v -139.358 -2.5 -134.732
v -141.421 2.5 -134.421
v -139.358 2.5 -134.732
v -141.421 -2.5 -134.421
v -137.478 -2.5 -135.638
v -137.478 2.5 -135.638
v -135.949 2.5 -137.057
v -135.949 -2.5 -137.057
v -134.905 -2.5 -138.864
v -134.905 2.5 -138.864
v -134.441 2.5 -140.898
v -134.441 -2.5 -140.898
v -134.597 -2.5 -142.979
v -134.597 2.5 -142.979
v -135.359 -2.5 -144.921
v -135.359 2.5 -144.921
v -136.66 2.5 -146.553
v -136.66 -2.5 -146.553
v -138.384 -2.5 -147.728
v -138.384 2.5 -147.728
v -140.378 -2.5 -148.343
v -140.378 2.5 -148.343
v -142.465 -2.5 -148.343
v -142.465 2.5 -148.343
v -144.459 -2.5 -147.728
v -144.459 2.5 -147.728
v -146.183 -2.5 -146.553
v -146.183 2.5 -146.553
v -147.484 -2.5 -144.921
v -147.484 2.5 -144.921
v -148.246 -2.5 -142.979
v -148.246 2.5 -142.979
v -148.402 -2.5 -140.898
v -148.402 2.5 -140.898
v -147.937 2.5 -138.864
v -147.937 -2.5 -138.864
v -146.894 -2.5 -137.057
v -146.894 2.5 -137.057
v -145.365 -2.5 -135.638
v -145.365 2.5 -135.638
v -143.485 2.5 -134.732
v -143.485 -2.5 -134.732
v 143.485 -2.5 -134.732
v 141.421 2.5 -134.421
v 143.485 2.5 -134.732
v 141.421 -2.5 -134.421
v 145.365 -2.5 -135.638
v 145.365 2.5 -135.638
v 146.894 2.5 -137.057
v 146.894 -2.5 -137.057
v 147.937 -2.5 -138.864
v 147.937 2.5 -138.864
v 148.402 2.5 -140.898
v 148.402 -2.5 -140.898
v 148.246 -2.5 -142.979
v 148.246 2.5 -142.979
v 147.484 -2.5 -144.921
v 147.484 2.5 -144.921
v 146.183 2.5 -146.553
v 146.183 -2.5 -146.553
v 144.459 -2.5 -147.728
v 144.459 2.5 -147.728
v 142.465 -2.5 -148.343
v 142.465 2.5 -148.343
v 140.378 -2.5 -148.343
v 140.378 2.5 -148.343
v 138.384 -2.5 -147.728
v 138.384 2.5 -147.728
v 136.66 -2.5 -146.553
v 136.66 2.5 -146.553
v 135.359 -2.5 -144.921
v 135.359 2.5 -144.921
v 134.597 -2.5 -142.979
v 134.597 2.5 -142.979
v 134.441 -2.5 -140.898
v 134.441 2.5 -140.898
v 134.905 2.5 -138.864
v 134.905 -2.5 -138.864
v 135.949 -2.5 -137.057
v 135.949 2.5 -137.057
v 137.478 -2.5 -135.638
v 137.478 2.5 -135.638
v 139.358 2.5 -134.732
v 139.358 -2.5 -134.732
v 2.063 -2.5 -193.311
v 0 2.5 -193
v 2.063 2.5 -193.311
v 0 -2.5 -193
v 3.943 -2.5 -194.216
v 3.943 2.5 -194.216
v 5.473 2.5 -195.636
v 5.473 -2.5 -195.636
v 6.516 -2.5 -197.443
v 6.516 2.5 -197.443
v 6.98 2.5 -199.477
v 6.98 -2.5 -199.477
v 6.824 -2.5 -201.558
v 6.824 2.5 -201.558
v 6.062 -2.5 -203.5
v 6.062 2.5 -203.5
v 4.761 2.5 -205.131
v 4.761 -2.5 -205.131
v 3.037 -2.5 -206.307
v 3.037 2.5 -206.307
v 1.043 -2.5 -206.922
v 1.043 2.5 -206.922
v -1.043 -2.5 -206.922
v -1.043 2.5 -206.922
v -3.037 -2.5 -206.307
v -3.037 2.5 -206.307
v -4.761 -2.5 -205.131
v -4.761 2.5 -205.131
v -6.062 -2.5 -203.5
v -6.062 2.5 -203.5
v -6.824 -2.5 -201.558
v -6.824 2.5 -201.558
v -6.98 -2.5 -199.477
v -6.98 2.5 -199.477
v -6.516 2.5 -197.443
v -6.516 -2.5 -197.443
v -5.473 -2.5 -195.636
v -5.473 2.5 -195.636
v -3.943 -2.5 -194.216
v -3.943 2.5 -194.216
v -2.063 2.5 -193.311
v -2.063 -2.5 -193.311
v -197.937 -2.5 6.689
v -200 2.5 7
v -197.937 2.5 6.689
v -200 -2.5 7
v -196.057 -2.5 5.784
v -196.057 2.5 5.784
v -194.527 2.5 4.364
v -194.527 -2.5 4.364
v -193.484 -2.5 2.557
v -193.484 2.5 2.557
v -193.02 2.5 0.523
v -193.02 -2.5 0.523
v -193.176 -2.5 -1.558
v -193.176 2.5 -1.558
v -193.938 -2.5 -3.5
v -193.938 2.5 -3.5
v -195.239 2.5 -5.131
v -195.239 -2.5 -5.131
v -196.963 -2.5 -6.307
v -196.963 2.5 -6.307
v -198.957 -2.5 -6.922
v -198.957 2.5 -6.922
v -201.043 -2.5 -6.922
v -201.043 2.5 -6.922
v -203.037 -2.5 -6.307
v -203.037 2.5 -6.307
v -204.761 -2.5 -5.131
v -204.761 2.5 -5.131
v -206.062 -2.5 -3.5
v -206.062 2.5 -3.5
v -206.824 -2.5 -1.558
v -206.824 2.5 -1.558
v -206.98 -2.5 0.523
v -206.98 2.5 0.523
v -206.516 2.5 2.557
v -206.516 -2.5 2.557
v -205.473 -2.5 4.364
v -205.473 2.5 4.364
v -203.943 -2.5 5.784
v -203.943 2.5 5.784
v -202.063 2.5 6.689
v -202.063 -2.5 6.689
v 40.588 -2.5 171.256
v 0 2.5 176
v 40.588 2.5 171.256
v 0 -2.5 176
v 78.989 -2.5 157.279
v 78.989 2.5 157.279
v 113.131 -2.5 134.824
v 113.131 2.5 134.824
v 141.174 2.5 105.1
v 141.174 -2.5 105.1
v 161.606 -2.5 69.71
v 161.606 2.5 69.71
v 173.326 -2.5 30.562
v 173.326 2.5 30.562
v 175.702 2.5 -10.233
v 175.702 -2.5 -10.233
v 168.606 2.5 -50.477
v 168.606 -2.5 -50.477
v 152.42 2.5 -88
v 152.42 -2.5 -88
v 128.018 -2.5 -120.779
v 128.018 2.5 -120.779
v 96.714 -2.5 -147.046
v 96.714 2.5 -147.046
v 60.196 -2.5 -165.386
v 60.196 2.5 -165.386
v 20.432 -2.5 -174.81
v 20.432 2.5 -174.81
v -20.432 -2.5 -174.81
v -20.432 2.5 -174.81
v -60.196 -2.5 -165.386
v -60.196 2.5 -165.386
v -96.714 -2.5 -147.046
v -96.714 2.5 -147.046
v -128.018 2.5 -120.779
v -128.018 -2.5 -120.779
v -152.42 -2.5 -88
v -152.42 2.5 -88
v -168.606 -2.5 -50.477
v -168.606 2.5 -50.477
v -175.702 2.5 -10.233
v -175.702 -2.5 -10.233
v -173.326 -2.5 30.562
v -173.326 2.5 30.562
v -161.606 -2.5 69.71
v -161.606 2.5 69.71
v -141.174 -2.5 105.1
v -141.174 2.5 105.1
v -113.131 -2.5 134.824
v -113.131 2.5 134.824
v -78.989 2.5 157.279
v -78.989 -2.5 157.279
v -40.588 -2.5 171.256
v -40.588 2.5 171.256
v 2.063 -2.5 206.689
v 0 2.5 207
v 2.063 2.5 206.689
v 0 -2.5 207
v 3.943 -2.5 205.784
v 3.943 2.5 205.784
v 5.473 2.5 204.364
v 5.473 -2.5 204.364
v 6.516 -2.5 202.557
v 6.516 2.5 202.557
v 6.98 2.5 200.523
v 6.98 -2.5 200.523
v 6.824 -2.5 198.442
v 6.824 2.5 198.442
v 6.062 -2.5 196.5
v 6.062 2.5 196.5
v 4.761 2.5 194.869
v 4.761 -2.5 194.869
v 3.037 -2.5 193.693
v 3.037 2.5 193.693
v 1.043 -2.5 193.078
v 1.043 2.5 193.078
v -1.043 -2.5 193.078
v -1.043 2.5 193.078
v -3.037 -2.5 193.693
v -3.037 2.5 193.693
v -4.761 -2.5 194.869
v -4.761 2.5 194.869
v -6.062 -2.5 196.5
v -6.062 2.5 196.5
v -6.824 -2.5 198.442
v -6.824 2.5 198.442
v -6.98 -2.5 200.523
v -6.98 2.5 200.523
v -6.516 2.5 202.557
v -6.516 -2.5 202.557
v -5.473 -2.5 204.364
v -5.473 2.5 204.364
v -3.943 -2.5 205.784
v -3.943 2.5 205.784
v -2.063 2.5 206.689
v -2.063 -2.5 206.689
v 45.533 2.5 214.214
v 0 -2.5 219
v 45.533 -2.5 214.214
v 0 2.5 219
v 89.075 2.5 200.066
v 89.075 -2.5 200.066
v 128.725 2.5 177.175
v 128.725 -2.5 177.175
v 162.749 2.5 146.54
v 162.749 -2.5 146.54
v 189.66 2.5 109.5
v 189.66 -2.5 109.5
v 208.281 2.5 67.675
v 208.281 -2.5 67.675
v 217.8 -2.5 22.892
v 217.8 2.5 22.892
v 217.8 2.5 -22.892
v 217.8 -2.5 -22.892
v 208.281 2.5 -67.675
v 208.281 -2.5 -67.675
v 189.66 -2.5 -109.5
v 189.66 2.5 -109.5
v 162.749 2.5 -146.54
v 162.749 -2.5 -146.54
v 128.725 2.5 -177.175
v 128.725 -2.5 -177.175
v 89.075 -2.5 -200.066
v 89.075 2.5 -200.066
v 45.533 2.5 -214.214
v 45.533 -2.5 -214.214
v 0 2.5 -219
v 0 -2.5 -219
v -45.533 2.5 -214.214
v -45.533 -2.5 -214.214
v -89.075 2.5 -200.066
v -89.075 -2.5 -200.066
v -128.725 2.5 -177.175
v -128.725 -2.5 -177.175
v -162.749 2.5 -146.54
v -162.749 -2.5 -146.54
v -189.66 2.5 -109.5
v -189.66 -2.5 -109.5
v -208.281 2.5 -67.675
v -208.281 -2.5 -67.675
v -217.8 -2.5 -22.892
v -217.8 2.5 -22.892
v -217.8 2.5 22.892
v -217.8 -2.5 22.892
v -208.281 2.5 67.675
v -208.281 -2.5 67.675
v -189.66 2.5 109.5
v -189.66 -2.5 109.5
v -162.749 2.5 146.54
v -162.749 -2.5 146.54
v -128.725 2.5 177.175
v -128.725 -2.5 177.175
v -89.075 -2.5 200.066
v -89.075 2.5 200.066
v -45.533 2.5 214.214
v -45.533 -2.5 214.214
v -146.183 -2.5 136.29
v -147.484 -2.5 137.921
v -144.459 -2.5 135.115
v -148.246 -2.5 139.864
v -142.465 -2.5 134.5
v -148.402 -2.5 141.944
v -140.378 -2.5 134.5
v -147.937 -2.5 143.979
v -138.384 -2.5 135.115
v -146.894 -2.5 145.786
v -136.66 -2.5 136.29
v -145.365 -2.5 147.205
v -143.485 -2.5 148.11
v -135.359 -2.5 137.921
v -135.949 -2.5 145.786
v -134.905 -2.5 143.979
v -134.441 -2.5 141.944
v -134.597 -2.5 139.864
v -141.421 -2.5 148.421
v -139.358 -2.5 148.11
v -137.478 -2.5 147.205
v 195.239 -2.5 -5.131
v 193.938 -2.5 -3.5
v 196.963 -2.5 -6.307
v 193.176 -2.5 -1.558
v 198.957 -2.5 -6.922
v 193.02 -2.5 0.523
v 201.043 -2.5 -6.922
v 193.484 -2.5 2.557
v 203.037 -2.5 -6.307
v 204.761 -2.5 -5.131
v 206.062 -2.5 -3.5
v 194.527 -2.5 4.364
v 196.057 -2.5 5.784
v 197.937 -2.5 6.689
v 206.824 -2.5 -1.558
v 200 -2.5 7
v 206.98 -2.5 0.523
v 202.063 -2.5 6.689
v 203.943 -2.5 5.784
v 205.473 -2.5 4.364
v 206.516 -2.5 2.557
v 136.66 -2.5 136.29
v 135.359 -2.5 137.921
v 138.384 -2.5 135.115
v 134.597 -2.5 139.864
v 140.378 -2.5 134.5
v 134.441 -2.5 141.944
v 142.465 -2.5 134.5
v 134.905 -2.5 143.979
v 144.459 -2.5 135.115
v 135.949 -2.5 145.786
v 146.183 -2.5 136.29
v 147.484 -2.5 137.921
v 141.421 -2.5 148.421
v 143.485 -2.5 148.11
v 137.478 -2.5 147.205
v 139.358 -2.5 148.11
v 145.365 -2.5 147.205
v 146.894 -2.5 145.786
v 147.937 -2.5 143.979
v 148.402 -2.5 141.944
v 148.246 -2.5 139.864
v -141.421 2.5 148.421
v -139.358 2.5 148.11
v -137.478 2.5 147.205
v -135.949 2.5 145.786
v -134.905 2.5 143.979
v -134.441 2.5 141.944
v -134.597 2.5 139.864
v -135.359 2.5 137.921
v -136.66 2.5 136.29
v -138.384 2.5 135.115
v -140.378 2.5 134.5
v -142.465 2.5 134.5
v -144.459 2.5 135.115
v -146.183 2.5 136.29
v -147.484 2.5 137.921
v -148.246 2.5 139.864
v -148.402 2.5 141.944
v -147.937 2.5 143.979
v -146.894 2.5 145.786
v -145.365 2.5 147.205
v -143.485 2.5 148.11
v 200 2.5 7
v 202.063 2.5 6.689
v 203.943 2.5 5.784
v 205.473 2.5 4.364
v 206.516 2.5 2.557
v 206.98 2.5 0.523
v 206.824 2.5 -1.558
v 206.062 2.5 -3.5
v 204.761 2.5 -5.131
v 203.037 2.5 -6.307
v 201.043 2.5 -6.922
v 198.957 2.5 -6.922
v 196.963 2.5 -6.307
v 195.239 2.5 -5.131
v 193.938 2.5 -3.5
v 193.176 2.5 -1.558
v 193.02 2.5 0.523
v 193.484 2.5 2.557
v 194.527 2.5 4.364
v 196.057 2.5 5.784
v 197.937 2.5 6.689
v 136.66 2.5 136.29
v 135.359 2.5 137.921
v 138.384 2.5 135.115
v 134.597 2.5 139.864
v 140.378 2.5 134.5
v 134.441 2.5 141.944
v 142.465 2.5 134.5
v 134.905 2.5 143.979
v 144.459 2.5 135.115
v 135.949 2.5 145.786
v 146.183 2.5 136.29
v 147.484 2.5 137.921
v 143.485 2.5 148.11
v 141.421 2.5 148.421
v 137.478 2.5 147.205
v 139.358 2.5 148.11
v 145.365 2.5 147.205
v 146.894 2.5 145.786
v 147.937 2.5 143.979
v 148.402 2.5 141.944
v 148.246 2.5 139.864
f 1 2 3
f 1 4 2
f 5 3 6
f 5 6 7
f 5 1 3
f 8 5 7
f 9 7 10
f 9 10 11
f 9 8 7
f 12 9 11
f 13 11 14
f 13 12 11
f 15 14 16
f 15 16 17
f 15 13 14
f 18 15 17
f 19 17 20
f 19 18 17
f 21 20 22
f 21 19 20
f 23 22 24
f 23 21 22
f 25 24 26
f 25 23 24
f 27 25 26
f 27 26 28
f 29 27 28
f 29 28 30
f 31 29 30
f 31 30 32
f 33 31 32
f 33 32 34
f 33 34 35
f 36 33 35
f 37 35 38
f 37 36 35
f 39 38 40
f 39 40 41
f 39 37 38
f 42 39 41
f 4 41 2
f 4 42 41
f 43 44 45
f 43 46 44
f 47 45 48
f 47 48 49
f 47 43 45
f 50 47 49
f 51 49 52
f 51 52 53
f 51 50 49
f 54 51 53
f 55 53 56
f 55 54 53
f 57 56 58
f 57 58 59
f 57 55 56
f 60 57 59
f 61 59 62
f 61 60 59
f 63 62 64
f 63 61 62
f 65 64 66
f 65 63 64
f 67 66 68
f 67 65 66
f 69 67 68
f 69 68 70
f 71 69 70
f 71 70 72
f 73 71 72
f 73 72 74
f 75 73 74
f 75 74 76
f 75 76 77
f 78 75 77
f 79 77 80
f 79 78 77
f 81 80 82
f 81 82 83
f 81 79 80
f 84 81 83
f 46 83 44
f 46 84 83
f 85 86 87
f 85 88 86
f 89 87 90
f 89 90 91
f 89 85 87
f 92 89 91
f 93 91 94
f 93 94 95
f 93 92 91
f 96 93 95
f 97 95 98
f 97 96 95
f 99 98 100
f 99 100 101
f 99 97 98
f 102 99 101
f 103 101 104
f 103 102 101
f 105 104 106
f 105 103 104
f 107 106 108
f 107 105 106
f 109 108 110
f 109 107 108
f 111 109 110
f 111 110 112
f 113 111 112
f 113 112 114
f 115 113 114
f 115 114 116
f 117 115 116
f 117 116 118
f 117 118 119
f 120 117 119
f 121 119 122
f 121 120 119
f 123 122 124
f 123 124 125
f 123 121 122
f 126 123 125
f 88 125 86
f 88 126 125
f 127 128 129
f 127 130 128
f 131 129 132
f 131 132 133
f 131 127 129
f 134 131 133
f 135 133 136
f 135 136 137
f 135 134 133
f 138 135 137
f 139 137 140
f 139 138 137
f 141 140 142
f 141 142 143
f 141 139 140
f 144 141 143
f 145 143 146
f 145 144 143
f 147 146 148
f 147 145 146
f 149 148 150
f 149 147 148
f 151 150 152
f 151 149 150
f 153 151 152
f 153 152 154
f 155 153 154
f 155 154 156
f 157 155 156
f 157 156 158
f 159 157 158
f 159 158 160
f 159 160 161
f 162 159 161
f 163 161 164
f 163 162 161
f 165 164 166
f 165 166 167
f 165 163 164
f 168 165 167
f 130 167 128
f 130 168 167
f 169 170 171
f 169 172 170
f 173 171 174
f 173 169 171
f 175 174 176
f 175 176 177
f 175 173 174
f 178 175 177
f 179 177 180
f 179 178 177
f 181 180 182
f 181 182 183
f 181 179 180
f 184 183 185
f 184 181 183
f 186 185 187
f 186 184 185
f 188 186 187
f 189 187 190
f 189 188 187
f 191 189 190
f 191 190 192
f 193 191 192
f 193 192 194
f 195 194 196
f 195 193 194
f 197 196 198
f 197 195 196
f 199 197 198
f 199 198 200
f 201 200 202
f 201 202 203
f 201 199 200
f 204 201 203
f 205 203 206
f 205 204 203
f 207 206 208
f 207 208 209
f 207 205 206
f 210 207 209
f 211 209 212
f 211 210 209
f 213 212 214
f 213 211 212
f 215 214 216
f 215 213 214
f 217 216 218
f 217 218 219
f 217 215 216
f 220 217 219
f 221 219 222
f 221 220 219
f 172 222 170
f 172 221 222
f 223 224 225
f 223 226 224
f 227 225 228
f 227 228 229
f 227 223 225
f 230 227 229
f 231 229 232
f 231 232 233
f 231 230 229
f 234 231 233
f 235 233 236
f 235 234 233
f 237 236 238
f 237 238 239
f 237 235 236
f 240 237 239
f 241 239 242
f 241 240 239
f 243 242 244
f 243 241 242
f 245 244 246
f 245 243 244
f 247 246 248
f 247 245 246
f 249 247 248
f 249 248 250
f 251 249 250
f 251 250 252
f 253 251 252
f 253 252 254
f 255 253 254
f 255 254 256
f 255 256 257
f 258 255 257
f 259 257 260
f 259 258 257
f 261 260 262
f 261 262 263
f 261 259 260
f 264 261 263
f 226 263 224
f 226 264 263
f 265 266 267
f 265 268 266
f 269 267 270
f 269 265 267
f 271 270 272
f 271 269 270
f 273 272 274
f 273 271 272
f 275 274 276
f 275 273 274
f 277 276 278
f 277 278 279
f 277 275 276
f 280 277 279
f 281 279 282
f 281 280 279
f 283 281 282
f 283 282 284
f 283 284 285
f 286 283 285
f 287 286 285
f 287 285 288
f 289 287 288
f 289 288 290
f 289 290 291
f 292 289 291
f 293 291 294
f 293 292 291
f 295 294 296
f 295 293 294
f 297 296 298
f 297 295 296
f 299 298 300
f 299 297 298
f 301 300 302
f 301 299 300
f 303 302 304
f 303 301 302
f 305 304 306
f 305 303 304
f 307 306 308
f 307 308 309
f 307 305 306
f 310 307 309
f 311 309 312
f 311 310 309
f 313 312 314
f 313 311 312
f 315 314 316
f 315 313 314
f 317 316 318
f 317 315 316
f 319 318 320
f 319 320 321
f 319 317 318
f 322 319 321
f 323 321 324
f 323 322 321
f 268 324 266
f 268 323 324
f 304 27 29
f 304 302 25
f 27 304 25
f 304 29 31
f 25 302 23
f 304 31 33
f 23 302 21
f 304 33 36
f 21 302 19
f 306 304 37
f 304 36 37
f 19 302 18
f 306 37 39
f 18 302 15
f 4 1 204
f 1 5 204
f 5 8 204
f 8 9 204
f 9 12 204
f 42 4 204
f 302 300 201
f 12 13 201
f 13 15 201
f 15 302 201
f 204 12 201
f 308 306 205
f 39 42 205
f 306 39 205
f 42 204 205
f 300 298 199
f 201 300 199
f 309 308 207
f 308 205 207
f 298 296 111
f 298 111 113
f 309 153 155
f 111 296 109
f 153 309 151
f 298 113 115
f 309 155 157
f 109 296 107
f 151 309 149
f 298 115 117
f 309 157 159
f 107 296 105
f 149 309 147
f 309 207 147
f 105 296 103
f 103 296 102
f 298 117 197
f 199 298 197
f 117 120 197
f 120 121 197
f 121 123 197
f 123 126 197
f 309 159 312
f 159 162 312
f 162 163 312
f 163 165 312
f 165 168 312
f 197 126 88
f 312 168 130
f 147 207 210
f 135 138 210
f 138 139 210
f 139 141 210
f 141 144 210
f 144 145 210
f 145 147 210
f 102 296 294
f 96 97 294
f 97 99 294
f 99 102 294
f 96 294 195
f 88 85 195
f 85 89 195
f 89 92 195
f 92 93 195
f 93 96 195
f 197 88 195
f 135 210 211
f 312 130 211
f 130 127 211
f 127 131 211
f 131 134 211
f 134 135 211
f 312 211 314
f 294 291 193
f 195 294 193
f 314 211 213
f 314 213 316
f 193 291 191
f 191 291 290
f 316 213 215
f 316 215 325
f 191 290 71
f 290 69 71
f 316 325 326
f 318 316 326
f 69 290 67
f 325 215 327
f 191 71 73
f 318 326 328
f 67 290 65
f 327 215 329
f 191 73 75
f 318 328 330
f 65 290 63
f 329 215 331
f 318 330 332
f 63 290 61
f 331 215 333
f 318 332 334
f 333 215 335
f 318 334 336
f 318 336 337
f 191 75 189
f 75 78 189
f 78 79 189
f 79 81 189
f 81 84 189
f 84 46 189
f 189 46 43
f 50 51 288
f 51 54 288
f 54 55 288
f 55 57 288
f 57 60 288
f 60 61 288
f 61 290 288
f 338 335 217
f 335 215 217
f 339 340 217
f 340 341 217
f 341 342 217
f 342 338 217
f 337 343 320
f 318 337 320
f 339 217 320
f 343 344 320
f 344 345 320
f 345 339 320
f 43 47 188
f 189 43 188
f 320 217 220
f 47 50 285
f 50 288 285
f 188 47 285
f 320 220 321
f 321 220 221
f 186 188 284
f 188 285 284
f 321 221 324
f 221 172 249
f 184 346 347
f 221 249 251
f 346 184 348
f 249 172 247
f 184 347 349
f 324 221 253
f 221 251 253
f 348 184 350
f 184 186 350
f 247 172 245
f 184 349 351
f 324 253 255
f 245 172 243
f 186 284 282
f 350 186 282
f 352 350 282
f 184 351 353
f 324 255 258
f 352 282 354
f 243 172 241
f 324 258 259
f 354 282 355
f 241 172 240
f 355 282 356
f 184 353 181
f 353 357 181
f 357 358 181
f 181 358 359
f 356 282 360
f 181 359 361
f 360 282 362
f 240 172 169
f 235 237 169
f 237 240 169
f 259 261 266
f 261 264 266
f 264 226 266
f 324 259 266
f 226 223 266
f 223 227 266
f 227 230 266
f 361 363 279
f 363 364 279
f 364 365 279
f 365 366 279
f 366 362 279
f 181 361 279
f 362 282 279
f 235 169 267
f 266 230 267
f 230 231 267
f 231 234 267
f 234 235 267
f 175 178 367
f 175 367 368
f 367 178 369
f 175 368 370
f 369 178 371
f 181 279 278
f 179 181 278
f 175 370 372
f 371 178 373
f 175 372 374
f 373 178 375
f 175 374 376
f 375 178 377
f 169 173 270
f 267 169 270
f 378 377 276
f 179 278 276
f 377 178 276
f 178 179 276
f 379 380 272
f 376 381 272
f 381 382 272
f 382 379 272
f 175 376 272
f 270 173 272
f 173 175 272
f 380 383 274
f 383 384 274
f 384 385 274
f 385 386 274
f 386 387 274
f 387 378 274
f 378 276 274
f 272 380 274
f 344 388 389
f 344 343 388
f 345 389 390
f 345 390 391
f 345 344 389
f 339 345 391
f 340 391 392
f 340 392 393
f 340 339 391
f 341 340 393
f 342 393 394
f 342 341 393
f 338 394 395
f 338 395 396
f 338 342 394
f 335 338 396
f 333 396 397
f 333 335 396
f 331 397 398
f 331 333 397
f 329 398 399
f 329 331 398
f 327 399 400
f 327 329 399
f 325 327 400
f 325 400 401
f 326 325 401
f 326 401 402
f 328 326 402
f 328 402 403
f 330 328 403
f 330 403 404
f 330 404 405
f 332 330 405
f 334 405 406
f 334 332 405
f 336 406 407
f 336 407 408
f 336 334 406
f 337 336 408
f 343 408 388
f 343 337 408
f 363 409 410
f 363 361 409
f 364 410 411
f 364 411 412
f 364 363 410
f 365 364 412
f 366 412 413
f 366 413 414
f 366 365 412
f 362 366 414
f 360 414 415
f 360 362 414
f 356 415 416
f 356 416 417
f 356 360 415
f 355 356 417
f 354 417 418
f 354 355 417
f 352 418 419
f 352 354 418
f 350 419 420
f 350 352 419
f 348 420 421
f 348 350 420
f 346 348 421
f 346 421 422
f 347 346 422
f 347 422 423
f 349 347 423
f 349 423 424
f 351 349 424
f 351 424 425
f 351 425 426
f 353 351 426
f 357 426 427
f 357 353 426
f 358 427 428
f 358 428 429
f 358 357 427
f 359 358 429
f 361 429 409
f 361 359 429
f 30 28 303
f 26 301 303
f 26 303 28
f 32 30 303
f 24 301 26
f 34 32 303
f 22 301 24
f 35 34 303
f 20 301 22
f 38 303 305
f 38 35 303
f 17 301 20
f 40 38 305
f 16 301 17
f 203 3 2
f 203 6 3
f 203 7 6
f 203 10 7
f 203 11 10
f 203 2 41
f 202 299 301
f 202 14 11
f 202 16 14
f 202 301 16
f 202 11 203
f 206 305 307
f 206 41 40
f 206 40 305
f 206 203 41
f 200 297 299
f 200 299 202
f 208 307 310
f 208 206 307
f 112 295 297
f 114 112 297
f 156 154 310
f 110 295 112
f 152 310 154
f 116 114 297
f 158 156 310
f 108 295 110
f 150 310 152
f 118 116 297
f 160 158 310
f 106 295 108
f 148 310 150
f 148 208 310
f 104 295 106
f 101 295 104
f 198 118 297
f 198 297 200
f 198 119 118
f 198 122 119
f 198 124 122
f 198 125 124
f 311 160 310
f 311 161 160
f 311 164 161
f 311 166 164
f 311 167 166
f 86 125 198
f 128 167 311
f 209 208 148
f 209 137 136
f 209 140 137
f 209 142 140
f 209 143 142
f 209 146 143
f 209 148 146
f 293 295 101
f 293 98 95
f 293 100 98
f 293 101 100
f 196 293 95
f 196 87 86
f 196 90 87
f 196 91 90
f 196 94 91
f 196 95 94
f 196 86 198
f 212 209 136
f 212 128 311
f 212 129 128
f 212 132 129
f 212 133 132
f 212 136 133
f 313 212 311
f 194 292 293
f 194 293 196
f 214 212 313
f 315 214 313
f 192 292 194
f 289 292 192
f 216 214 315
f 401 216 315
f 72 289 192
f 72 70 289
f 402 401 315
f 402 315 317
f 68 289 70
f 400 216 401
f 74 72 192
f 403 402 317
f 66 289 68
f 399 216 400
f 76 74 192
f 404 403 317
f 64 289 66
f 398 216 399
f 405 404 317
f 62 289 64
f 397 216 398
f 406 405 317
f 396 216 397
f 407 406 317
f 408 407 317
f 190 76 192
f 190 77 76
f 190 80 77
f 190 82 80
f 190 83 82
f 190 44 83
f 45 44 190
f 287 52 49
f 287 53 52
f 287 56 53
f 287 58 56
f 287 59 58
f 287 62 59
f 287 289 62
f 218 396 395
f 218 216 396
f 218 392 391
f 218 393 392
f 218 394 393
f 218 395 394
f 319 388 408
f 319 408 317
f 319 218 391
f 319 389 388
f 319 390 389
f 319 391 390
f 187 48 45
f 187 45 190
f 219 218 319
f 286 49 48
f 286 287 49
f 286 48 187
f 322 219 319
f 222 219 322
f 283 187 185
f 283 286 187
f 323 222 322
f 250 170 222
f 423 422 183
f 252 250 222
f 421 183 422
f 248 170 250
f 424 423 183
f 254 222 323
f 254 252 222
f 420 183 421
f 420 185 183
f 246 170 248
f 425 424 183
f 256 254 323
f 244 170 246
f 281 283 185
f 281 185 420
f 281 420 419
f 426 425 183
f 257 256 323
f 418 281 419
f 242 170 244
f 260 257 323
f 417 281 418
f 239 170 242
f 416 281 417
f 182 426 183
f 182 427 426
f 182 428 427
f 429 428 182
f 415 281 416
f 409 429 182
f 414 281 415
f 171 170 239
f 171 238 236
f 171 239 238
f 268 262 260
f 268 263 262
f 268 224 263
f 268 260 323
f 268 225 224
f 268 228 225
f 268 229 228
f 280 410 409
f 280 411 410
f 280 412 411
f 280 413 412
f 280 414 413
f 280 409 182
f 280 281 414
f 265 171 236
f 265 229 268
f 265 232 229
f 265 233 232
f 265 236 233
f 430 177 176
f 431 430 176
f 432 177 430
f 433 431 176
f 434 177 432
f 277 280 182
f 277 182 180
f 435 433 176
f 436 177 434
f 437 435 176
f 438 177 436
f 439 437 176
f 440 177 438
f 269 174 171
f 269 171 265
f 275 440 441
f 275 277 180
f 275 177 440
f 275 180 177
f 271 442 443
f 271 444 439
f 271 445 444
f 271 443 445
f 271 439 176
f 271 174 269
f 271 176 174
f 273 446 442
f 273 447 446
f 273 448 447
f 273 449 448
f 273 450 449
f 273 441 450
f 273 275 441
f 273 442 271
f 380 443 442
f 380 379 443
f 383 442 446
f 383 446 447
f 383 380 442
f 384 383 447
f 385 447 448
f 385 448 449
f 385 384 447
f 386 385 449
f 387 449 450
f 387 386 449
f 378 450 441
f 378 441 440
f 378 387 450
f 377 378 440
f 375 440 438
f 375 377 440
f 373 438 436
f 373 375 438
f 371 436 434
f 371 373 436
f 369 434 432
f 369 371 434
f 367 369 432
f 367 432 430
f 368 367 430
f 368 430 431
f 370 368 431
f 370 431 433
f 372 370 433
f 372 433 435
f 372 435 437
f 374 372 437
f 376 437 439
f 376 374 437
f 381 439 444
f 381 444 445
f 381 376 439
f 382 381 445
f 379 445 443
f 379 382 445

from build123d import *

# Parameters (mm, degrees)
SCHIZZO1_R                   = 219
SCHIZZO1_R_2                 = 176
SCHIZZO1_R_3                 = 7
ESTRUSIONE_ESTRUSIONE1_DEPTH = 2.5


with BuildPart() as part:
    # Schizzo1 → Estrusione-Estrusione1 (new, symmetric)
    with BuildSketch(Plane(origin=(0, 0, 0), x_dir=(1, 0, 0), z_dir=(0, 1, 0))):
        with Locations(Location((0, 0, 0), (0, 0, 270))):
            Circle(SCHIZZO1_R)
        with Locations(Location((0, 0, 0), (0, 0, 270))):
            Circle(SCHIZZO1_R_2, mode=Mode.SUBTRACT)
        with Locations(Location((0, 200, 0), (0, 0, 270))):
            Circle(SCHIZZO1_R_3, mode=Mode.SUBTRACT)
        with Locations(Location((141.421356237, 141.421356237, 0), (0, 0, 270))):
            Circle(SCHIZZO1_R_3, mode=Mode.SUBTRACT)
        with Locations(Location((200, 0, 0), (0, 0, 270))):
            Circle(SCHIZZO1_R_3, mode=Mode.SUBTRACT)
        with Locations(Location((141.421356237, -141.421356237, 0), (0, 0, 270))):
            Circle(SCHIZZO1_R_3, mode=Mode.SUBTRACT)
        with Locations(Location((0, -200, 0), (0, 0, 270))):
            Circle(SCHIZZO1_R_3, mode=Mode.SUBTRACT)
        with Locations(Location((-141.421356237, -141.421356237, 0), (0, 0, 270))):
            Circle(SCHIZZO1_R_3, mode=Mode.SUBTRACT)
        with Locations(Location((-200, 0, 0), (0, 0, 270))):
            Circle(SCHIZZO1_R_3, mode=Mode.SUBTRACT)
        with Locations(Location((-141.421356237, 141.421356237, 0), (0, 0, 270))):
            Circle(SCHIZZO1_R_3, mode=Mode.SUBTRACT)
    extrude(amount=ESTRUSIONE_ESTRUSIONE1_DEPTH, both=True)


solid = part.part
